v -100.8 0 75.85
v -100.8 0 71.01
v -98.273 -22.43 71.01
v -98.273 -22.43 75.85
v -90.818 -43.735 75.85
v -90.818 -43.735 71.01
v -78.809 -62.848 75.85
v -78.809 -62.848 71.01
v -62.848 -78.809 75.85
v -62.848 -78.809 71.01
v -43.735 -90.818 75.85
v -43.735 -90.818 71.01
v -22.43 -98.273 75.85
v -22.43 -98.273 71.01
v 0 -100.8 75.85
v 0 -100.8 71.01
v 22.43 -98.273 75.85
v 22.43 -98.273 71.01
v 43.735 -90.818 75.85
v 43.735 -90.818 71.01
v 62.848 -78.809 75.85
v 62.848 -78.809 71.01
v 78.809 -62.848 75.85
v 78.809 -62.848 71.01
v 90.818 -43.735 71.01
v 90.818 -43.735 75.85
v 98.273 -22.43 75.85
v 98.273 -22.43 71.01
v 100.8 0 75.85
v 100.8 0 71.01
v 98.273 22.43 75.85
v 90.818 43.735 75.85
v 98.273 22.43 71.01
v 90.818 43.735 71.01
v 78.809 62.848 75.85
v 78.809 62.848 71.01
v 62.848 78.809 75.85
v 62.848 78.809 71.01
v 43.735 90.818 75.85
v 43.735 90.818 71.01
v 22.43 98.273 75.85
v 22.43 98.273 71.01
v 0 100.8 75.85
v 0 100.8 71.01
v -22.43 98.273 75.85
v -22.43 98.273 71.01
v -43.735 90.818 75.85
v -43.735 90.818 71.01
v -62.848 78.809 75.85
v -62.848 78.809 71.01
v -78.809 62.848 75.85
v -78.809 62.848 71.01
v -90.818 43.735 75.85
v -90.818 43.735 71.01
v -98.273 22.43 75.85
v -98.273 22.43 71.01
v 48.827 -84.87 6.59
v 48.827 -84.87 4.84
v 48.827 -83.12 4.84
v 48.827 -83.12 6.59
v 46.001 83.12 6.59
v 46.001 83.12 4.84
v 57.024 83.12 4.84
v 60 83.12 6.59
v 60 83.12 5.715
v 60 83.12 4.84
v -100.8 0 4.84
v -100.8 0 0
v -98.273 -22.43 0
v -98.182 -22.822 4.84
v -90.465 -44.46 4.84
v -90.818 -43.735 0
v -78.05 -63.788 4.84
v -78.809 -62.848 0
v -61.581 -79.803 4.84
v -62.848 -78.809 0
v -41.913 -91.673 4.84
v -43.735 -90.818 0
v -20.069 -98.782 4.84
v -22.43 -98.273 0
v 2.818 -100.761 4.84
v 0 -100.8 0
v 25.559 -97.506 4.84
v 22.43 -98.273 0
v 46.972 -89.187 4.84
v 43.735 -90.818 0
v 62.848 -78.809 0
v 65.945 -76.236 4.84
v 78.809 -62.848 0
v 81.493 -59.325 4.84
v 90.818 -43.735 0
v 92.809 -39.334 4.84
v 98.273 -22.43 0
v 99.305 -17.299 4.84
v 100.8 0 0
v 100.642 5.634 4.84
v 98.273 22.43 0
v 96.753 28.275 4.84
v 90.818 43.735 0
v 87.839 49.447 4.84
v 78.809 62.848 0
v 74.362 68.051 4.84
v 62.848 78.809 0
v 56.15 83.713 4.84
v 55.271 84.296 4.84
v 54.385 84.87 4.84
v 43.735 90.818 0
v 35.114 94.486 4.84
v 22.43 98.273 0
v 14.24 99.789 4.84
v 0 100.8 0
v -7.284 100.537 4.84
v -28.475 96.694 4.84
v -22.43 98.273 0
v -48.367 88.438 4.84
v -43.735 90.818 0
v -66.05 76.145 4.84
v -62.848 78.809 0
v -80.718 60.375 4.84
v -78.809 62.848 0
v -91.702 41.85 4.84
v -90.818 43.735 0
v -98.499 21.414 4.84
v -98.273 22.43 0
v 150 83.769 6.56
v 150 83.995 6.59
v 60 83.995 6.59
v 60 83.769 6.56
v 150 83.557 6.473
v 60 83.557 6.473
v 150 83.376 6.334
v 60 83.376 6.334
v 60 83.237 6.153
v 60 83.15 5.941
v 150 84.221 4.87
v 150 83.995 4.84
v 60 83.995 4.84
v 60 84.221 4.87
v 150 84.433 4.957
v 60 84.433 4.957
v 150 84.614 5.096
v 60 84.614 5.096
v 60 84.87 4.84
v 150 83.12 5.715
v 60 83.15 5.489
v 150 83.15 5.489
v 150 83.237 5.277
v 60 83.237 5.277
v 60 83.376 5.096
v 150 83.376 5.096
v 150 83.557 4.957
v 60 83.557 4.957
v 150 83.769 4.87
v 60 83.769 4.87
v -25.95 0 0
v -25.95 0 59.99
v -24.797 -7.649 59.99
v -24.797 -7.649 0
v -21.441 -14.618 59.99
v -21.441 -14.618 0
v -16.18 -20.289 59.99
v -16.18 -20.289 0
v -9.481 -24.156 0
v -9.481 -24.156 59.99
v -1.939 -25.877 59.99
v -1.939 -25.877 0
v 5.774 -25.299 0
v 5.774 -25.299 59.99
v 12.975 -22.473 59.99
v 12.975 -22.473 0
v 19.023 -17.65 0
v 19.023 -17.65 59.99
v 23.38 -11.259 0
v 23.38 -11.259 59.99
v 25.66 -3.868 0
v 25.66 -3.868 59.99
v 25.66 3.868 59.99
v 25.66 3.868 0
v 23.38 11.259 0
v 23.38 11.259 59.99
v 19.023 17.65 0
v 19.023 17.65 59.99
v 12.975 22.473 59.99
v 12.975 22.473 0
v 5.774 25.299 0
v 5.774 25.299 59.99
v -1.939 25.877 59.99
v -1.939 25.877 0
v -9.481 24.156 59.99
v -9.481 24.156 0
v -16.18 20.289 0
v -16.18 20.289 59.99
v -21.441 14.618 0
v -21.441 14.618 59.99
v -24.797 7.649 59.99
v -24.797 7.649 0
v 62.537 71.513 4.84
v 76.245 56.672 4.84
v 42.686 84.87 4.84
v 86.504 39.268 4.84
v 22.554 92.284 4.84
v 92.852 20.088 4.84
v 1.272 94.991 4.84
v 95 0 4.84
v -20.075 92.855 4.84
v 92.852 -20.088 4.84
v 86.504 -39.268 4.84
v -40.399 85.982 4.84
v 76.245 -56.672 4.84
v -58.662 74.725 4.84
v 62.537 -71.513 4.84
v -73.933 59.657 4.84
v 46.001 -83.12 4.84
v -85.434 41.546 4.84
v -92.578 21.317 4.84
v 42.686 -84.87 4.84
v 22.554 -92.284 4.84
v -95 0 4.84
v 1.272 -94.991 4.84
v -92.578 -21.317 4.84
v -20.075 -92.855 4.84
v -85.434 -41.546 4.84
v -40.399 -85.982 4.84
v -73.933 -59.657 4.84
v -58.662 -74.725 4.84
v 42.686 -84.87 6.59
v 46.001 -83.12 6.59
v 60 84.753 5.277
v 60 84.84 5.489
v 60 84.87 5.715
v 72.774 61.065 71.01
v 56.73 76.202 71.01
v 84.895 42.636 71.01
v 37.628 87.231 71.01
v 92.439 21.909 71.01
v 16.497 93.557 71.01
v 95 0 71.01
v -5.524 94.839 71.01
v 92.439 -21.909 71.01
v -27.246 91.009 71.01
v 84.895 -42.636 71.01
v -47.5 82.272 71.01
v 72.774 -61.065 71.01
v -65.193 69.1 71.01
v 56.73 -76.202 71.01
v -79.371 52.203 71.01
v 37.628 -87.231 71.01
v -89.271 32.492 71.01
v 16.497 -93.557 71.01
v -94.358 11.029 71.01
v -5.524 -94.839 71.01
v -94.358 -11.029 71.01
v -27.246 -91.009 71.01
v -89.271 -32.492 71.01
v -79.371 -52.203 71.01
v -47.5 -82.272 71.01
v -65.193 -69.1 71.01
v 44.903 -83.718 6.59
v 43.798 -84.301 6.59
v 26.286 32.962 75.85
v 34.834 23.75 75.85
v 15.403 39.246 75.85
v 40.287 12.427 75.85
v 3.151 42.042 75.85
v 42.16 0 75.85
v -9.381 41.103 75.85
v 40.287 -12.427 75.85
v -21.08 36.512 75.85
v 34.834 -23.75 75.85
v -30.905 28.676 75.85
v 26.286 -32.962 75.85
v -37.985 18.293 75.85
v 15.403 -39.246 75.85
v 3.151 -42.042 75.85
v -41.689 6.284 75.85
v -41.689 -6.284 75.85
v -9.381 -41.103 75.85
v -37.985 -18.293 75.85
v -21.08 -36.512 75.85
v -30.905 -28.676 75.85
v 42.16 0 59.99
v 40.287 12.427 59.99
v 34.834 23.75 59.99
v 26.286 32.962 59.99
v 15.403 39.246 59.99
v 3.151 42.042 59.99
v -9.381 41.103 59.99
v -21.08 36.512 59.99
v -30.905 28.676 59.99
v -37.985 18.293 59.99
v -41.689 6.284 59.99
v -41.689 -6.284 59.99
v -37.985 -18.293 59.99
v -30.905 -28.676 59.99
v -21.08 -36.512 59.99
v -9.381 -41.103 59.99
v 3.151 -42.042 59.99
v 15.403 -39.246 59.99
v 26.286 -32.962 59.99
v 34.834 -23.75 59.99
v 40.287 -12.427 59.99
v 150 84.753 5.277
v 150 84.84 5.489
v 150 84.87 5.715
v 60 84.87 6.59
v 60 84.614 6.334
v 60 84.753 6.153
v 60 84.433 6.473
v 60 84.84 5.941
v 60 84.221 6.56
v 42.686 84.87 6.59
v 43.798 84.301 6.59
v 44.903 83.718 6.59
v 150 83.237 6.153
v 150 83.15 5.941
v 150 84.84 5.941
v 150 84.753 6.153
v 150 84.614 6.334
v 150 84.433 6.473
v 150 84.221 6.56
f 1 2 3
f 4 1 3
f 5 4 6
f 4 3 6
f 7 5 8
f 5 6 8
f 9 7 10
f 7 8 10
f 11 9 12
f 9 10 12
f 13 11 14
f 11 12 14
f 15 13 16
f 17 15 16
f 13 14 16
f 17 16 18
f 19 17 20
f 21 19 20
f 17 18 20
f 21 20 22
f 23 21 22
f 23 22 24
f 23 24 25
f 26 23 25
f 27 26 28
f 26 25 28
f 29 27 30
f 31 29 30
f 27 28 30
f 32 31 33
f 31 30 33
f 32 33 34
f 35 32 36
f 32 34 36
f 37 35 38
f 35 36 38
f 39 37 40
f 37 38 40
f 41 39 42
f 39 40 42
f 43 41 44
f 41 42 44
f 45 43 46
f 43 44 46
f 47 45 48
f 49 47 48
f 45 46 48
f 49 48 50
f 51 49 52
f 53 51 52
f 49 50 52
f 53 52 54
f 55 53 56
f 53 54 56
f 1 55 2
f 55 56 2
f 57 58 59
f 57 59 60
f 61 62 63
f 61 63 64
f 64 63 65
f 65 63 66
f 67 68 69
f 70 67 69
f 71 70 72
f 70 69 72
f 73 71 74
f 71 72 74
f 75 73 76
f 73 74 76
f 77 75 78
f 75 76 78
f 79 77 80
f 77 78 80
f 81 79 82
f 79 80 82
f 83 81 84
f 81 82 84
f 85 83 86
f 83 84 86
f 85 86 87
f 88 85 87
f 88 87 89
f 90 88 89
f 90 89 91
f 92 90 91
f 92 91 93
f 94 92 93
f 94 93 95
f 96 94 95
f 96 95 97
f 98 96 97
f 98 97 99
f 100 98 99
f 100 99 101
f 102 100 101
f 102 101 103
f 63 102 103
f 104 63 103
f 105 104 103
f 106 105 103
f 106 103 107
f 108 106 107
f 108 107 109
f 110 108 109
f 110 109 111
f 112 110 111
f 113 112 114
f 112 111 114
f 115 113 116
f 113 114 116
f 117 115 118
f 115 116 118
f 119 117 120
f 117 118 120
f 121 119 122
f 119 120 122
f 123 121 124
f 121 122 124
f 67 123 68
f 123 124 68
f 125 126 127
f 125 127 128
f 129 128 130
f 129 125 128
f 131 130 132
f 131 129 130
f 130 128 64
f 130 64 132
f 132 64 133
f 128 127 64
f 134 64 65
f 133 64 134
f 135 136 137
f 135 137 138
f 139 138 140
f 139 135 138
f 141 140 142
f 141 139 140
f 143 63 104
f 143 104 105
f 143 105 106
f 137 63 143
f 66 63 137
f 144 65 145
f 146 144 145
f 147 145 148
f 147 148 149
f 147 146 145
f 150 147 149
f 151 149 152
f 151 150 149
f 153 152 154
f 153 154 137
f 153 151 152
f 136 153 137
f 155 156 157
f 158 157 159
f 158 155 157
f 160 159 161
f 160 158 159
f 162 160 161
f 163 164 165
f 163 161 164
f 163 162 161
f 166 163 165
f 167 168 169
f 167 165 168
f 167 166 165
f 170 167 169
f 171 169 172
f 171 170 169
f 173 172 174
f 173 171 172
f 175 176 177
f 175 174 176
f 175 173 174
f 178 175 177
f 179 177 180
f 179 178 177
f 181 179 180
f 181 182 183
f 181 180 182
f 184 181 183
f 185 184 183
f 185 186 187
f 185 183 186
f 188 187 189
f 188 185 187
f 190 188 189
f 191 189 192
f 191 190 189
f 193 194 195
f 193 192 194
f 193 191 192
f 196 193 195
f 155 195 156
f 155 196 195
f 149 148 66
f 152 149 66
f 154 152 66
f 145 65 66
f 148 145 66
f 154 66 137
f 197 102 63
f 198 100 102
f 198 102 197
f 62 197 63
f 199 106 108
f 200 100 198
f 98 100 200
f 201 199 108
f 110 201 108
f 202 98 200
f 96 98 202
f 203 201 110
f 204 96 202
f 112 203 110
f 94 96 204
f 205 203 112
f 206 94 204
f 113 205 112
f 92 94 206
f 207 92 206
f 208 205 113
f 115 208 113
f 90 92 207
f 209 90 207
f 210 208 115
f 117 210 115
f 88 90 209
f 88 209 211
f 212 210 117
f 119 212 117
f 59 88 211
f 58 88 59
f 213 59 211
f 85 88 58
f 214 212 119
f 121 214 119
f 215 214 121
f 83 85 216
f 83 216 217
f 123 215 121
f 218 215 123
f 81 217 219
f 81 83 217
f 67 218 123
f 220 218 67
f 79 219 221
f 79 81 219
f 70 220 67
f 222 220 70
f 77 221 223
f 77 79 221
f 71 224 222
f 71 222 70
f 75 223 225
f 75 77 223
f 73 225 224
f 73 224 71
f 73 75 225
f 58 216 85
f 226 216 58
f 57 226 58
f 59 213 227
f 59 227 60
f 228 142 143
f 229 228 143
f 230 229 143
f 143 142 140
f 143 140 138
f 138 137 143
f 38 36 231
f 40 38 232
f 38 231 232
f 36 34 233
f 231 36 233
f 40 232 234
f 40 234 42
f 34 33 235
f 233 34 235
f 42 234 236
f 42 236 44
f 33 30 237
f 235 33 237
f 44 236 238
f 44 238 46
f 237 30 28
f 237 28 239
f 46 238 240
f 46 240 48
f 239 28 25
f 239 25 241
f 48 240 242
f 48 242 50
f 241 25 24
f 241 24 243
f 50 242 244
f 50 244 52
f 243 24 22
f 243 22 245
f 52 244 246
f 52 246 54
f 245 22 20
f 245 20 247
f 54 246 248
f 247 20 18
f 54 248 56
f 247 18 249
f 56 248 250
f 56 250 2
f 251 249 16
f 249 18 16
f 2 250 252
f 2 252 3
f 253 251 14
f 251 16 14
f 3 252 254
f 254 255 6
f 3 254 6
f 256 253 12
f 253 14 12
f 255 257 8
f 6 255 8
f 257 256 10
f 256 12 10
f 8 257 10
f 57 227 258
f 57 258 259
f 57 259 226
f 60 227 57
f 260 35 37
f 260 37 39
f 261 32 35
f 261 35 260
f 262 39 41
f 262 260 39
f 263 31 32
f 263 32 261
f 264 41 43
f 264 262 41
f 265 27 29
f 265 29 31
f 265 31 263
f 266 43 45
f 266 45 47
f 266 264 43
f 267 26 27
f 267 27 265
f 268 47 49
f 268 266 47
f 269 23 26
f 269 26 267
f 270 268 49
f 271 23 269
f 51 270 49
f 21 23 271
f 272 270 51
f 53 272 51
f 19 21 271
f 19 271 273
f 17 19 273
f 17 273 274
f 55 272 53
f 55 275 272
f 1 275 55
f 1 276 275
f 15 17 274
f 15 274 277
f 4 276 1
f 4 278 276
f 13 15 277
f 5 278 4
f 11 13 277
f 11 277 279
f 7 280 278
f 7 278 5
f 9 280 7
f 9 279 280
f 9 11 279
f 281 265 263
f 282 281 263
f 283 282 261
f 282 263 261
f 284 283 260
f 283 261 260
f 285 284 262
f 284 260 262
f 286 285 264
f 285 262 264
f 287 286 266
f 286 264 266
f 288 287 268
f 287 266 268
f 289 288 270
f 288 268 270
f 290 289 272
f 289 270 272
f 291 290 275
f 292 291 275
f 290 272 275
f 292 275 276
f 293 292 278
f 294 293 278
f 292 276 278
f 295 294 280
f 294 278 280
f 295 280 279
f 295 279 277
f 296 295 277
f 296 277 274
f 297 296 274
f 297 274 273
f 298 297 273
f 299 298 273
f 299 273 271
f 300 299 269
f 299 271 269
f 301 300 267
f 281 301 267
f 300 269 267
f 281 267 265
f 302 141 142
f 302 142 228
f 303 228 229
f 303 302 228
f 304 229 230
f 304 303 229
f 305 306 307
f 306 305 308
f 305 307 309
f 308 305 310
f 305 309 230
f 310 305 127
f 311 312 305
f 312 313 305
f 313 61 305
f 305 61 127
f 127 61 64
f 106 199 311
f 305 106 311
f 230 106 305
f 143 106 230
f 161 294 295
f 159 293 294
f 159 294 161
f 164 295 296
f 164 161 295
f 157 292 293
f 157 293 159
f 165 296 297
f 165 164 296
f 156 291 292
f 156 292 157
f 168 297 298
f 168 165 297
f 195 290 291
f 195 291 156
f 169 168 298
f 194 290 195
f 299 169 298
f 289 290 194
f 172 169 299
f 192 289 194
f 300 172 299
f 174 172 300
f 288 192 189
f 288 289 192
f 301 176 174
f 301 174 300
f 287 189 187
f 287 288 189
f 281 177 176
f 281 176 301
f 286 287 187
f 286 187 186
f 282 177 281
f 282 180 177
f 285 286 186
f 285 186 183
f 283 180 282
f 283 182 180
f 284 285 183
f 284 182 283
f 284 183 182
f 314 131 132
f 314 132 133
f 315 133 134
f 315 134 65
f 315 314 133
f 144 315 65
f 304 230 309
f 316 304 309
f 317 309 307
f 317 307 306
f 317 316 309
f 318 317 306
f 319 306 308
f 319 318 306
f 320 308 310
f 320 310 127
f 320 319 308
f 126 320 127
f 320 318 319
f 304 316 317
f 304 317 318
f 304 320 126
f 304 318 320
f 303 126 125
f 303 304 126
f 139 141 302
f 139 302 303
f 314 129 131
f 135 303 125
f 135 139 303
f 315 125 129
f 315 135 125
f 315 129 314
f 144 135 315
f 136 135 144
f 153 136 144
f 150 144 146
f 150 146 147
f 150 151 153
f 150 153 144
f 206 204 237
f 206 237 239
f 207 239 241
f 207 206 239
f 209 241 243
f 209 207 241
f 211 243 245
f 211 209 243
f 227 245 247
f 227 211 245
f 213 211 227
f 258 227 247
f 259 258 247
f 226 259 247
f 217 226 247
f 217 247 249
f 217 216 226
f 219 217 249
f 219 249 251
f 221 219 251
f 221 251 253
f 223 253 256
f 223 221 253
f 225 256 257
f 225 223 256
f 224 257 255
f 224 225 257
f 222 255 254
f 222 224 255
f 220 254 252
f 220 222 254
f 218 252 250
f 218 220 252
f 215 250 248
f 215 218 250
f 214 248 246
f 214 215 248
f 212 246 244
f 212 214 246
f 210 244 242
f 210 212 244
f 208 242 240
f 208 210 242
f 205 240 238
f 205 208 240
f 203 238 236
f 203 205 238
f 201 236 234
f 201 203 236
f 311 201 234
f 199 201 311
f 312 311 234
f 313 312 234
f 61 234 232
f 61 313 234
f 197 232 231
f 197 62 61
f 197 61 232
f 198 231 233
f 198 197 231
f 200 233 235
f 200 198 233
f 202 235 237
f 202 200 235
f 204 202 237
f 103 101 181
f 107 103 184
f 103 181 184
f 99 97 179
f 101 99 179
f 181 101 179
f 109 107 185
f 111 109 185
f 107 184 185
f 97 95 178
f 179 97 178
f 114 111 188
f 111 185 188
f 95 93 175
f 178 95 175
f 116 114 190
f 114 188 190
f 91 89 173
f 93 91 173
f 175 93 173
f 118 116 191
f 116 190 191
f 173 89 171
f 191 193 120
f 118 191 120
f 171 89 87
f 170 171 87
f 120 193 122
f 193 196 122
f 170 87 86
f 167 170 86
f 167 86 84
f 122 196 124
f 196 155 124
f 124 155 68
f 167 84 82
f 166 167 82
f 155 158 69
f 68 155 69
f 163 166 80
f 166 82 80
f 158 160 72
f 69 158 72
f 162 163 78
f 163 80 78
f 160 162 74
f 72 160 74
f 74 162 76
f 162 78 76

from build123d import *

# Parameters (mm, degrees)
SKETCH1_R           = 100.8
SKETCH1_R_2         = 25.95
BOSS_EXTRUDE1_DEPTH = 4.84
SKETCH2_R           = 45.11
SKETCH2_R_2         = 25.95
BOSS_EXTRUDE2_DEPTH = 66.17
SKETCH3_R           = 100.8
SKETCH3_R_2         = 25.95
BOSS_EXTRUDE3_DEPTH = 4.84
SKETCH4_R           = 42.16
CUT_EXTRUDE1_DEPTH  = 15.86
BOSS_EXTRUDE4_START = 66.17
SKETCH5_R           = 95
SKETCH5_R_2         = 45.11
BOSS_EXTRUDE4_DEPTH = 66.17
SKETCH6_W           = 150
SKETCH6_H           = 1.75
BOSS_EXTRUDE5_DEPTH = 1.75
CUT_EXTRUDE5_DEPTH  = 90
SKETCH11_W          = 101.173290866
SKETCH11_H          = 1.75
CUT_EXTRUDE6_DEPTH  = 1.75


with BuildPart() as part:
    # Sketch1 → Boss-Extrude1 (new body)
    with BuildSketch(Plane.XY):
        with Locations(Location((0, 0, 0), (0, 0, 180))):
            Circle(SKETCH1_R)
        with Locations(Location((0, 0, 0), (0, 0, 180))):
            Circle(SKETCH1_R_2, mode=Mode.SUBTRACT)
    extrude(amount=BOSS_EXTRUDE1_DEPTH)

    # Sketch2 → Boss-Extrude2 (add)
    with BuildSketch(Plane.XY.offset(4.84)):
        Circle(SKETCH2_R)
        with Locations(Location((0, 0, 0), (0, 0, 180))):
            Circle(SKETCH2_R_2, mode=Mode.SUBTRACT)
    extrude(amount=BOSS_EXTRUDE2_DEPTH)

    # Sketch3 → Boss-Extrude3 (add)
    with BuildSketch(Plane.XY.offset(71.01)):
        with Locations(Location((0, 0, 0), (0, 0, 180))):
            Circle(SKETCH3_R)
        with Locations(Location((0, 0, 0), (0, 0, 180))):
            Circle(SKETCH3_R_2, mode=Mode.SUBTRACT)
    extrude(amount=BOSS_EXTRUDE3_DEPTH)

    # Sketch4 → Cut-Extrude1 (cut)
    with BuildSketch(Plane.XY.offset(75.85)):
        Circle(SKETCH4_R)
    extrude(amount=-CUT_EXTRUDE1_DEPTH, mode=Mode.SUBTRACT)

    # Sketch5 → Boss-Extrude4 (add)
    with BuildSketch(Plane(origin=(0, 0, 71.01), x_dir=(-1, 0, 0), z_dir=(0, 0, -1)).offset(BOSS_EXTRUDE4_START)):
        with Locations(Location((0, 0, 0), (0, 0, 180))):
            Circle(SKETCH5_R)
        Circle(SKETCH5_R_2, mode=Mode.SUBTRACT)
    boss_extrude4 = extrude(amount=-BOSS_EXTRUDE4_DEPTH)

    # Sketch6 → Boss-Extrude5 (add)
    with BuildSketch(Plane.XY.offset(4.84)):
        with Locations((75, -83.995)):
            Rectangle(SKETCH6_W, SKETCH6_H)
    boss_extrude5 = extrude(amount=BOSS_EXTRUDE5_DEPTH)

    # Sketch7 → Cut-Extrude5 (cut)
    with BuildSketch(Plane(origin=(150, 0, 0), x_dir=(0, 0, -1), z_dir=(1, 0, 0))):
        with BuildLine():
            Line((-6.333718434, -83.376281566), (-6.59, -83.12))
            Line((-6.59, -83.12), (-6.59, -83.995))
            ThreePointArc((-6.59, -83.995), (-6.523394591, -83.660151997), (-6.333718434, -83.376281566))
        make_face()
        with BuildLine():
            Line((-5.715, -83.12), (-6.59, -83.12))
            Line((-6.59, -83.12), (-6.333718434, -83.376281566))
            ThreePointArc((-6.333718434, -83.376281566), (-6.049848003, -83.186605409), (-5.715, -83.12))
        make_face()
        with BuildLine():
            Line((-4.84, -83.12), (-5.715, -83.12))
            ThreePointArc((-5.715, -83.12), (-5.096281566, -83.376281566), (-4.84, -83.995))
            Line((-4.84, -83.995), (-4.84, -83.12))
        make_face()
        with BuildLine():
            ThreePointArc((-4.84, -83.995), (-4.906605409, -84.329848003), (-5.096281566, -84.613718434))
            Line((-5.096281566, -84.613718434), (-4.84, -84.87))
            Line((-4.84, -84.87), (-4.84, -83.995))
        make_face()
        with BuildLine():
            Line((-4.84, -84.87), (-5.096281566, -84.613718434))
            ThreePointArc((-5.096281566, -84.613718434), (-5.380151997, -84.803394591), (-5.715, -84.87))
            Line((-5.715, -84.87), (-4.84, -84.87))
        make_face()
        with BuildLine():
            ThreePointArc((-5.715, -84.87), (-6.333718434, -84.613718434), (-6.59, -83.995))
            Line((-6.59, -83.995), (-6.59, -84.87))
            Line((-6.59, -84.87), (-5.715, -84.87))
        make_face()
    cut_extrude5 = extrude(amount=-CUT_EXTRUDE5_DEPTH, mode=Mode.SUBTRACT)

    # Mirror5: Boss-Extrude4, Boss-Extrude5, Cut-Extrude5 across plane
    add(boss_extrude4.mirror(Plane.ZX))
    add(boss_extrude5.mirror(Plane.ZX))
    add(cut_extrude5.mirror(Plane.ZX), mode=Mode.SUBTRACT)

    # Sketch11 → Cut-Extrude6 (cut)
    with BuildSketch(Plane.XZ.offset(84.87)):
        with Locations((99.413354567, 5.715)):
            Rectangle(SKETCH11_W, SKETCH11_H)
    extrude(amount=-CUT_EXTRUDE6_DEPTH, mode=Mode.SUBTRACT)


solid = part.part
